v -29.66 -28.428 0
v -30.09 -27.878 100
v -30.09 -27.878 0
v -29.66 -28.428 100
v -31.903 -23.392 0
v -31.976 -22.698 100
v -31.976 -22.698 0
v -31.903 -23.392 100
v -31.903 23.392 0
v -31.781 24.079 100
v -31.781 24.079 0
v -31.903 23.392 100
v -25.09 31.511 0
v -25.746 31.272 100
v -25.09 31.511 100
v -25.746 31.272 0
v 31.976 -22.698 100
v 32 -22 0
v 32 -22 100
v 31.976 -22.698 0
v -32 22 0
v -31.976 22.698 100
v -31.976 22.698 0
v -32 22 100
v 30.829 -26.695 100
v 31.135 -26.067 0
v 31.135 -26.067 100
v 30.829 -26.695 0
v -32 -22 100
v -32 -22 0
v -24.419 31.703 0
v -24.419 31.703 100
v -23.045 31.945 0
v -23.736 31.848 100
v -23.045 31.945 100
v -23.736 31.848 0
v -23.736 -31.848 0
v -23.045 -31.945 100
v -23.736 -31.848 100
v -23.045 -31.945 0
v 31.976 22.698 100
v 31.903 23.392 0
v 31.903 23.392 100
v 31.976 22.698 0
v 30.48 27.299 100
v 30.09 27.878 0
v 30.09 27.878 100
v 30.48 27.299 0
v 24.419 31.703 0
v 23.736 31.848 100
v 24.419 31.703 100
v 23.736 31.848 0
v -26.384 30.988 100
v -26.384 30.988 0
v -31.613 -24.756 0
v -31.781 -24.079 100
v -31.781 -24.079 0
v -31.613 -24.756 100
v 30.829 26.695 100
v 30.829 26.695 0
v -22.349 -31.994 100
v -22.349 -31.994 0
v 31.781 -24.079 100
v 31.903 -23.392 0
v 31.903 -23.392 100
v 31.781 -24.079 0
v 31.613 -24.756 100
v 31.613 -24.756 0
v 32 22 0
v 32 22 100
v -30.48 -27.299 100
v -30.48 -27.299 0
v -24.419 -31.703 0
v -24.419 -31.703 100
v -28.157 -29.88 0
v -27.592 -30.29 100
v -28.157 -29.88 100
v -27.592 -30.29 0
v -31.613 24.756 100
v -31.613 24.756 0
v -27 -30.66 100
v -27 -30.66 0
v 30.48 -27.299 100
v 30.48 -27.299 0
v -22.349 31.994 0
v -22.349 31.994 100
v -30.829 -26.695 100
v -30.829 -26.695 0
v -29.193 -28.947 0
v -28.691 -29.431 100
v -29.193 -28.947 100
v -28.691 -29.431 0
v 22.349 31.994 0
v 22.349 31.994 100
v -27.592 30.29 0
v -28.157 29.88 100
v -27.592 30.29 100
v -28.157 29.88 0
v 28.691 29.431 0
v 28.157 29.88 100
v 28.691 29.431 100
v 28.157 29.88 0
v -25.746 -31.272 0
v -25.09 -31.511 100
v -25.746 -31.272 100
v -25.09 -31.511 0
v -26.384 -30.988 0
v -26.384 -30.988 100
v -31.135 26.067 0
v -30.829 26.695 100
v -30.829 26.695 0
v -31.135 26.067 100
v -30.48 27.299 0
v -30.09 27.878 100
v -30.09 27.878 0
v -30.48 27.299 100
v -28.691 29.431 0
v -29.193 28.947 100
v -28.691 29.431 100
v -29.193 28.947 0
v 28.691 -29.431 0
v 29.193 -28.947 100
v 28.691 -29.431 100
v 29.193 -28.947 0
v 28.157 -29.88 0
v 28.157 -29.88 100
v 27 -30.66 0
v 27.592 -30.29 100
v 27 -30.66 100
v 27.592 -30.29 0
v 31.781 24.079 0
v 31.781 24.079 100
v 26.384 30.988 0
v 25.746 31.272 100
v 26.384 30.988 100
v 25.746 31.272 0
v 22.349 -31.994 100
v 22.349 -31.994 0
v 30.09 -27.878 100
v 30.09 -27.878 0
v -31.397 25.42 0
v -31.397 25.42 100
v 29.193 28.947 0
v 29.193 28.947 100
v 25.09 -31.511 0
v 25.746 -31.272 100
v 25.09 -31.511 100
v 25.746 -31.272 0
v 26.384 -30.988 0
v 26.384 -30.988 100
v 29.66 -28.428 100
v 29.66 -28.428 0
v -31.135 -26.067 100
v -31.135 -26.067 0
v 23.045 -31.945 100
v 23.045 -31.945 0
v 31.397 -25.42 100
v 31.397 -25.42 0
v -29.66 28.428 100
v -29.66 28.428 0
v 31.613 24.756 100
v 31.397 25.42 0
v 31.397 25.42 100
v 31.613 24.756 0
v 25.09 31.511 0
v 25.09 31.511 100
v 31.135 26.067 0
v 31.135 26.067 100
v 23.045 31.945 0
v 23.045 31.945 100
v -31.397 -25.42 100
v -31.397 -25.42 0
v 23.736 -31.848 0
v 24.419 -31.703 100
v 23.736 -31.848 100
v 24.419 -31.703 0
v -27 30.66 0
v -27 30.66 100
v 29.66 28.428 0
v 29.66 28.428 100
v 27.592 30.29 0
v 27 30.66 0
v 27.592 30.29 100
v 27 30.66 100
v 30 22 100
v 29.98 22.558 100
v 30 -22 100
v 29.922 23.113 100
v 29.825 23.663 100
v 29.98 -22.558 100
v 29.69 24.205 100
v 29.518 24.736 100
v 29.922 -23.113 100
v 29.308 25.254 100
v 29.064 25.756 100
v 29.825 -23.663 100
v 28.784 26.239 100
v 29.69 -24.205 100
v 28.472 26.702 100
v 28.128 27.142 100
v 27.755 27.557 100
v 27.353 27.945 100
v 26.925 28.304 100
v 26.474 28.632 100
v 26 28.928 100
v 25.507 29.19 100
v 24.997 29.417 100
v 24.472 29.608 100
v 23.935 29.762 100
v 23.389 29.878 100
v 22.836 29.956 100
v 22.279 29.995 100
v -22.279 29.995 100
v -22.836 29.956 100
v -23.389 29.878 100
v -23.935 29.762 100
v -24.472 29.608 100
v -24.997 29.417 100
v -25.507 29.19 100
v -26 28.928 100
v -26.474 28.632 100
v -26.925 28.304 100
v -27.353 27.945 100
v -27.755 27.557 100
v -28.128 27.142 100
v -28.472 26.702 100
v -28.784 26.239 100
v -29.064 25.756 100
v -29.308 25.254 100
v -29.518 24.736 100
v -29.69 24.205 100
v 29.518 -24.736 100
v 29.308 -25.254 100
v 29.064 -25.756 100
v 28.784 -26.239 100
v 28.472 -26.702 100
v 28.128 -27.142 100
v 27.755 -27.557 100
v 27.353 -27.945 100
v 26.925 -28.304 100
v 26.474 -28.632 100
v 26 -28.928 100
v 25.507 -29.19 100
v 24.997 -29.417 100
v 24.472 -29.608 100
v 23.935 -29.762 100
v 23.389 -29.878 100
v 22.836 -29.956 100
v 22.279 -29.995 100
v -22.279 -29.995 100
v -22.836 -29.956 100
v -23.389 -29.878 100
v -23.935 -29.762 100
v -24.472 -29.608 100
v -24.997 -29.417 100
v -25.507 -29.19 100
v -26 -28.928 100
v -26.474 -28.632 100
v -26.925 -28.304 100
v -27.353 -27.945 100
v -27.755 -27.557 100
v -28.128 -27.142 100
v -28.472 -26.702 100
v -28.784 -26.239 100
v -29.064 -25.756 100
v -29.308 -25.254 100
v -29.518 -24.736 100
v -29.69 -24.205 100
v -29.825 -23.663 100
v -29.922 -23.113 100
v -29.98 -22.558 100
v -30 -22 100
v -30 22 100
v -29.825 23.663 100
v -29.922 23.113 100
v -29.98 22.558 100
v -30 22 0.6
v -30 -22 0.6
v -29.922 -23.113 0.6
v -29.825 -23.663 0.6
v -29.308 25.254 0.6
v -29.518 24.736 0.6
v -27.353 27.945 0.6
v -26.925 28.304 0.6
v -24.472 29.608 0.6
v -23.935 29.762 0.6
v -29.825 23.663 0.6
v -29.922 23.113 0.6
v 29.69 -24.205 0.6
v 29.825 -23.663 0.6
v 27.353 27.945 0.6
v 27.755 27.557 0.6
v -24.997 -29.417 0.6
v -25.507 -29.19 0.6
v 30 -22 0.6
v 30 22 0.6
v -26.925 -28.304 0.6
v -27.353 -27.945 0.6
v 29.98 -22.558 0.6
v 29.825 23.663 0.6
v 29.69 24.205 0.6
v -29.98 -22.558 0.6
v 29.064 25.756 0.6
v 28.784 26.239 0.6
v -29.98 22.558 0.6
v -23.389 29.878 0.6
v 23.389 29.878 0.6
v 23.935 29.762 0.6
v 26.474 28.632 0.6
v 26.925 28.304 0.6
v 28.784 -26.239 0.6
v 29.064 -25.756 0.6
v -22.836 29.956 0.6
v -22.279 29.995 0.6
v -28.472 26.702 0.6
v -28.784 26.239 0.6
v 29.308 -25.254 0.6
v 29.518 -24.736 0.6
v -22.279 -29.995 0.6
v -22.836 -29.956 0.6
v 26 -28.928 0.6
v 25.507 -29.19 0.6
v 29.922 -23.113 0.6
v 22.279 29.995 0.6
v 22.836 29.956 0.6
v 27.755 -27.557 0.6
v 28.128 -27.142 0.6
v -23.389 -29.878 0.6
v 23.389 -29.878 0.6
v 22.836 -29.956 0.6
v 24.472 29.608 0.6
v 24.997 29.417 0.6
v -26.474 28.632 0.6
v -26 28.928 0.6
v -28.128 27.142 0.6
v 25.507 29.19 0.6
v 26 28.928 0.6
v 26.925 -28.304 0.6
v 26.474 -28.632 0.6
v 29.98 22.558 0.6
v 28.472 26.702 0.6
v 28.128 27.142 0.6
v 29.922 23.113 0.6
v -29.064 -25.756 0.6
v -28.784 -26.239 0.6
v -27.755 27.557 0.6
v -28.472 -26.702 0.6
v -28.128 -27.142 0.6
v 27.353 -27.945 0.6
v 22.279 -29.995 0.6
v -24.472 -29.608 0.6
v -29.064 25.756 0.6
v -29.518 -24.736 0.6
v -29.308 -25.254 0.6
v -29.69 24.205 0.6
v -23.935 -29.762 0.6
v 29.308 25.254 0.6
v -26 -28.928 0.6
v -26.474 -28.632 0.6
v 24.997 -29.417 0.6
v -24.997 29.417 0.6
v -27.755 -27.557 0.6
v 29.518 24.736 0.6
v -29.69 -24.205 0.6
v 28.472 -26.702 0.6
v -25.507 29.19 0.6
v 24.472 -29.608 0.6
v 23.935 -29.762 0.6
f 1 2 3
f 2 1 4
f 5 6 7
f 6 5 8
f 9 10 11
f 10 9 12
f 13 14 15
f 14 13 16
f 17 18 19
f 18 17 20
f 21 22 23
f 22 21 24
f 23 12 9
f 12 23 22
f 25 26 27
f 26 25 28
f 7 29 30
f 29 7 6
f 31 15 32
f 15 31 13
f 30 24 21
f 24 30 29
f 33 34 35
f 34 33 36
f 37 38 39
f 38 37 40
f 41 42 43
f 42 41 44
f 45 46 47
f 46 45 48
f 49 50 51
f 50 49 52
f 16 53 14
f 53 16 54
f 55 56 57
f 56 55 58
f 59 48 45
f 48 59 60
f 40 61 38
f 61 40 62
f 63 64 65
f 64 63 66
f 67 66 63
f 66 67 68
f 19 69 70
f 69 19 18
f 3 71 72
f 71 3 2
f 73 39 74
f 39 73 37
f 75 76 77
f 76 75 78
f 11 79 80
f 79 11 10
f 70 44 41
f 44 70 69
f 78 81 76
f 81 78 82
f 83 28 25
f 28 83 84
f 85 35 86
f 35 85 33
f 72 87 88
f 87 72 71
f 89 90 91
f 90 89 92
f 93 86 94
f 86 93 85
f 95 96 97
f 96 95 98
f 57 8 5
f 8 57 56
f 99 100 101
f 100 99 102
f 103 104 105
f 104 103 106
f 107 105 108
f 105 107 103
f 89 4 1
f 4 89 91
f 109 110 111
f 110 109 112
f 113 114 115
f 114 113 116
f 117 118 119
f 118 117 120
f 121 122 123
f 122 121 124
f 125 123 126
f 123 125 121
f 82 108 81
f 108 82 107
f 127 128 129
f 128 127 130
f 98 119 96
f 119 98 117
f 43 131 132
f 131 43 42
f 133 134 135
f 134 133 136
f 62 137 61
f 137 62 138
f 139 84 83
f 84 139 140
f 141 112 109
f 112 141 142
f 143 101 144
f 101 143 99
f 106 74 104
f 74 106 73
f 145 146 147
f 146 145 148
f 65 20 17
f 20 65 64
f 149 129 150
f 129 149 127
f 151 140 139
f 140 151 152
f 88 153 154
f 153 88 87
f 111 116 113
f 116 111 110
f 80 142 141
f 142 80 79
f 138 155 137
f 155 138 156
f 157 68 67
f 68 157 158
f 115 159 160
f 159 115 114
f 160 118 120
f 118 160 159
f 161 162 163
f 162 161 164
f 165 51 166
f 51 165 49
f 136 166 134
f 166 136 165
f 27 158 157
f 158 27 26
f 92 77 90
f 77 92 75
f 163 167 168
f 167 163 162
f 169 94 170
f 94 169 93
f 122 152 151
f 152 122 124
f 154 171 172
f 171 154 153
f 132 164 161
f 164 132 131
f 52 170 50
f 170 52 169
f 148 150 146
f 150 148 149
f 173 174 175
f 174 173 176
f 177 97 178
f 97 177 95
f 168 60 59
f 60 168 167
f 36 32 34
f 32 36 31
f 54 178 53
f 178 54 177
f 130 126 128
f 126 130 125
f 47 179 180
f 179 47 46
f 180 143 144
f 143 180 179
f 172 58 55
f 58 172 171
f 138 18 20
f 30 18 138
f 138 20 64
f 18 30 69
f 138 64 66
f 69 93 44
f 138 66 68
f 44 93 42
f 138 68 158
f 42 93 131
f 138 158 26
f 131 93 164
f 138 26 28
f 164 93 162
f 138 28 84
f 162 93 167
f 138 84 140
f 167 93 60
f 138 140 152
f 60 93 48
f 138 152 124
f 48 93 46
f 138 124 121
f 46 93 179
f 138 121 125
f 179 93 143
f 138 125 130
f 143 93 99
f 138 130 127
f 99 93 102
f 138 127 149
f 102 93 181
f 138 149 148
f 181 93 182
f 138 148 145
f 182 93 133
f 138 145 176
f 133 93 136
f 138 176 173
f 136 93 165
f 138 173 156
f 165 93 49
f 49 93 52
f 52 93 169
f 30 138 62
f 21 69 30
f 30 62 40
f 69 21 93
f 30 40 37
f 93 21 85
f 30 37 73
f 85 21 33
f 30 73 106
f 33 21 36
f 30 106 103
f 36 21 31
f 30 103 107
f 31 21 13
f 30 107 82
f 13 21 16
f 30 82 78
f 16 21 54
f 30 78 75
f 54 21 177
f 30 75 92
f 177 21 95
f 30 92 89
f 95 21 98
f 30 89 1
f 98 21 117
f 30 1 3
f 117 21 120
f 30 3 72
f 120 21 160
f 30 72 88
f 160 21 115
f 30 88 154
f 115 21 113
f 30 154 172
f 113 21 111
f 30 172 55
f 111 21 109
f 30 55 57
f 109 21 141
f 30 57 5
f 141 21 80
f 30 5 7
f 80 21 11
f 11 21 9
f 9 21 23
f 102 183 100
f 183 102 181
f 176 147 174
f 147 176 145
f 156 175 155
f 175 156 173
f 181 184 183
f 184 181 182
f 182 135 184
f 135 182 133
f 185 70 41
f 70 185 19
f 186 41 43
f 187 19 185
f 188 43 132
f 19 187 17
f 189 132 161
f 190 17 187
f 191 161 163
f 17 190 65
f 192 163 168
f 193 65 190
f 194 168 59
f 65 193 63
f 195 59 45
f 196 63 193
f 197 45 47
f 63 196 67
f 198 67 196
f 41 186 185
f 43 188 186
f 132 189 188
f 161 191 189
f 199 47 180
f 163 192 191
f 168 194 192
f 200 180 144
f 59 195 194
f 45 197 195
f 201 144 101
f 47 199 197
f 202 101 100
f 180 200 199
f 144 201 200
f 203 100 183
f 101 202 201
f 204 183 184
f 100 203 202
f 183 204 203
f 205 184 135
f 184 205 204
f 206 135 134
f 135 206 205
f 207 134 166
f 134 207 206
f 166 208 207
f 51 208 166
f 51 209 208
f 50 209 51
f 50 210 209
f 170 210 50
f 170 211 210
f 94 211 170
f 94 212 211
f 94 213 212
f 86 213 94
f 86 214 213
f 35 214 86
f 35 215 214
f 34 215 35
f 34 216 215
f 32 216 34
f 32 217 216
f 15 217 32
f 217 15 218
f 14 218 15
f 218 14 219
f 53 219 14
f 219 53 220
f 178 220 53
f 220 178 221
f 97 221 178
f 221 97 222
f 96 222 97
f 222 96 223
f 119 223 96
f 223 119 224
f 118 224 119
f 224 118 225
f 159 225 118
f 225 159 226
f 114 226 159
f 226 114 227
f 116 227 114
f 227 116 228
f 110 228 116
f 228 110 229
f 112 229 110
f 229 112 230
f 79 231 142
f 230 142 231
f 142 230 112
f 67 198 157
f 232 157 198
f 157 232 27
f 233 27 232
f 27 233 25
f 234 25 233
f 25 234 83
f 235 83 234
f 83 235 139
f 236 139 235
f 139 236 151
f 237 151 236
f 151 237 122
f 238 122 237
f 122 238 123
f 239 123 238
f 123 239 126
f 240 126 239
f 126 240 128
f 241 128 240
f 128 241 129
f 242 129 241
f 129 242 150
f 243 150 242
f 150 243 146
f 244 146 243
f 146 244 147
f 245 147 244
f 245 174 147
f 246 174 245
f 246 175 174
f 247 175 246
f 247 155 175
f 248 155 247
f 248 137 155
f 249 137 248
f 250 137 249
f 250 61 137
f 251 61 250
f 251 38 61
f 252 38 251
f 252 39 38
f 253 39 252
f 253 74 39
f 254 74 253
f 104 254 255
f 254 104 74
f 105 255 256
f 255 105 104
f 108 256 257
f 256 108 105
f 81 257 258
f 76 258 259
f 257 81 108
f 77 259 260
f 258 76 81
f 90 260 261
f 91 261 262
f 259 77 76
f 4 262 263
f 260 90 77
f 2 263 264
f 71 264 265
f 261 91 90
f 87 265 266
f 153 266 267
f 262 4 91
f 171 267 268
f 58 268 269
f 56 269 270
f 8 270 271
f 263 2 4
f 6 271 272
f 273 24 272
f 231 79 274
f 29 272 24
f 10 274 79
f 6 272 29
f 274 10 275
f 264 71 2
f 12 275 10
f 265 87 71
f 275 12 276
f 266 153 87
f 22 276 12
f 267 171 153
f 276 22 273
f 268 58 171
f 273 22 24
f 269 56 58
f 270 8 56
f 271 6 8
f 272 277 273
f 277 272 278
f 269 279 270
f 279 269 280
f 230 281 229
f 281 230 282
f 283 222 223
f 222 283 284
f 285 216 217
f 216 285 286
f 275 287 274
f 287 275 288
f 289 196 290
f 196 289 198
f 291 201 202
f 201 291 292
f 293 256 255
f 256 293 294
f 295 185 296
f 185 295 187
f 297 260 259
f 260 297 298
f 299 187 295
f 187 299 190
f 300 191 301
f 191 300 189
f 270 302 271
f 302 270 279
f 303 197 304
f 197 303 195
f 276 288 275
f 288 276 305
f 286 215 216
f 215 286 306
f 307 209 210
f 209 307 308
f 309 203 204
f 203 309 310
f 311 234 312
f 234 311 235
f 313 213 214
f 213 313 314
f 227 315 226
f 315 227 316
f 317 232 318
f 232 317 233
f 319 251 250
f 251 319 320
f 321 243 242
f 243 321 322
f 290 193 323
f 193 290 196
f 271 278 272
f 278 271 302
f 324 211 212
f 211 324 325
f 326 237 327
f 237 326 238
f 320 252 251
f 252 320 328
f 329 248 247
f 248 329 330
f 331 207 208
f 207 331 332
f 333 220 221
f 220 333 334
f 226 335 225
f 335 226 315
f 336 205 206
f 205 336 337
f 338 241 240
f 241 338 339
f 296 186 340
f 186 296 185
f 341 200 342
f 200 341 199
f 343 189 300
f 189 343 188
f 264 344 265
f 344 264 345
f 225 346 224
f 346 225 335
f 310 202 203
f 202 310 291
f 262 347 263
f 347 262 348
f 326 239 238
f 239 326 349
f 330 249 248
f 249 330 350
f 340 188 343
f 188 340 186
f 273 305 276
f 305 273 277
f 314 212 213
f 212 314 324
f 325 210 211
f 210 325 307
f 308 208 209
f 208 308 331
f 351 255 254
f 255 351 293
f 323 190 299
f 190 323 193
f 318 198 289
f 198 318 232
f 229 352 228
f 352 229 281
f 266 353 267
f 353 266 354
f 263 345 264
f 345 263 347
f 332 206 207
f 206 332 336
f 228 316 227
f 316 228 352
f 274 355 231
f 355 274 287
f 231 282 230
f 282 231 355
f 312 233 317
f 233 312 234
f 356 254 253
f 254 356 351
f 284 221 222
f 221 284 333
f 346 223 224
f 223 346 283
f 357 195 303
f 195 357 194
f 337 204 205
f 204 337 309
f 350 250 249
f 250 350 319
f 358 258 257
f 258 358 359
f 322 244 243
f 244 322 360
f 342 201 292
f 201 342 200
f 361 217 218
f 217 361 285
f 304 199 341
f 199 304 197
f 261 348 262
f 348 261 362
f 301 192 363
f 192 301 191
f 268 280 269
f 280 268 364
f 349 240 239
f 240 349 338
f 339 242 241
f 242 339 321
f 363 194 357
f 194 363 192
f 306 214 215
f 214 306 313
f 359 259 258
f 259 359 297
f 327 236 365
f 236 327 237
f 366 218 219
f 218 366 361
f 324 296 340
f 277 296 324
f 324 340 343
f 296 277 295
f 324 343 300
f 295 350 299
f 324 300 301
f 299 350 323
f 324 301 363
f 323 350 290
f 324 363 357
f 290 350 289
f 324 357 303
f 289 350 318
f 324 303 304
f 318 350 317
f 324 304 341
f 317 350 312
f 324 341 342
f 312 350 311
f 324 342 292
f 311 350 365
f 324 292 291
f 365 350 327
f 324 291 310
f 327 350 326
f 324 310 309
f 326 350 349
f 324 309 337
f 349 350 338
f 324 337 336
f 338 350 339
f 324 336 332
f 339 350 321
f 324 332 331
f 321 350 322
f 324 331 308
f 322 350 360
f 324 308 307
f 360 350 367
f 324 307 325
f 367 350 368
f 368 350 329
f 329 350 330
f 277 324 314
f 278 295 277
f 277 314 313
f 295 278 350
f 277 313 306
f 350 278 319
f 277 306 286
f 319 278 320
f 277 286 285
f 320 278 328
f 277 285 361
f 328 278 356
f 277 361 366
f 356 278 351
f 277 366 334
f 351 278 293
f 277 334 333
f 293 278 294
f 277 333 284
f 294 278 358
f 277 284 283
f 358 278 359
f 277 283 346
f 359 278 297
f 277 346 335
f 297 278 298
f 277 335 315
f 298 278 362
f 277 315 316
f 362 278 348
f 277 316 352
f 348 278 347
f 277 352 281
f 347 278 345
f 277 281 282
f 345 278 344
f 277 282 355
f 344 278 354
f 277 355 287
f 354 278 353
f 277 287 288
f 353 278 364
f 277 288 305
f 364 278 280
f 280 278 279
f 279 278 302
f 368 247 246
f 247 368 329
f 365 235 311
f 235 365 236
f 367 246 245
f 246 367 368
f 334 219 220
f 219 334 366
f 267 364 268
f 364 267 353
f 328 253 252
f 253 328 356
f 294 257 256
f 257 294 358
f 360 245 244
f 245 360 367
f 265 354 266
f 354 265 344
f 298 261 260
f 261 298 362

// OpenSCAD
$fn = 90;

x_size           =  64;   // Outside to outside X axis dimension
y_size           =  64;   // Outside to outside Y axis dimension
wall             =   2;   // Thickness of cup walls
corner_radius    =  10;   // Radius for corners
cup_height       = 100;   // Total height
bottom_thickness =   0.6; // Thickness of bottom of cup

module outside (cup_height, x_size, y_size, corner_radius) {
  linear_extrude (height = cup_height)
    hull ()
      for (x = [-1, 1])
        for (y = [-1, 1])
          translate ([x * ((x_size / 2) - corner_radius), y * ((y_size / 2) - corner_radius), 0])
            circle (r = corner_radius);
}

difference () {
  translate ([0, 0, 0])
    outside (cup_height, x_size, y_size, corner_radius);
  translate ([0, 0, bottom_thickness])
    outside ((cup_height - bottom_thickness) + 0.01, x_size - (wall * 2), y_size - (wall * 2), corner_radius - wall);
}
